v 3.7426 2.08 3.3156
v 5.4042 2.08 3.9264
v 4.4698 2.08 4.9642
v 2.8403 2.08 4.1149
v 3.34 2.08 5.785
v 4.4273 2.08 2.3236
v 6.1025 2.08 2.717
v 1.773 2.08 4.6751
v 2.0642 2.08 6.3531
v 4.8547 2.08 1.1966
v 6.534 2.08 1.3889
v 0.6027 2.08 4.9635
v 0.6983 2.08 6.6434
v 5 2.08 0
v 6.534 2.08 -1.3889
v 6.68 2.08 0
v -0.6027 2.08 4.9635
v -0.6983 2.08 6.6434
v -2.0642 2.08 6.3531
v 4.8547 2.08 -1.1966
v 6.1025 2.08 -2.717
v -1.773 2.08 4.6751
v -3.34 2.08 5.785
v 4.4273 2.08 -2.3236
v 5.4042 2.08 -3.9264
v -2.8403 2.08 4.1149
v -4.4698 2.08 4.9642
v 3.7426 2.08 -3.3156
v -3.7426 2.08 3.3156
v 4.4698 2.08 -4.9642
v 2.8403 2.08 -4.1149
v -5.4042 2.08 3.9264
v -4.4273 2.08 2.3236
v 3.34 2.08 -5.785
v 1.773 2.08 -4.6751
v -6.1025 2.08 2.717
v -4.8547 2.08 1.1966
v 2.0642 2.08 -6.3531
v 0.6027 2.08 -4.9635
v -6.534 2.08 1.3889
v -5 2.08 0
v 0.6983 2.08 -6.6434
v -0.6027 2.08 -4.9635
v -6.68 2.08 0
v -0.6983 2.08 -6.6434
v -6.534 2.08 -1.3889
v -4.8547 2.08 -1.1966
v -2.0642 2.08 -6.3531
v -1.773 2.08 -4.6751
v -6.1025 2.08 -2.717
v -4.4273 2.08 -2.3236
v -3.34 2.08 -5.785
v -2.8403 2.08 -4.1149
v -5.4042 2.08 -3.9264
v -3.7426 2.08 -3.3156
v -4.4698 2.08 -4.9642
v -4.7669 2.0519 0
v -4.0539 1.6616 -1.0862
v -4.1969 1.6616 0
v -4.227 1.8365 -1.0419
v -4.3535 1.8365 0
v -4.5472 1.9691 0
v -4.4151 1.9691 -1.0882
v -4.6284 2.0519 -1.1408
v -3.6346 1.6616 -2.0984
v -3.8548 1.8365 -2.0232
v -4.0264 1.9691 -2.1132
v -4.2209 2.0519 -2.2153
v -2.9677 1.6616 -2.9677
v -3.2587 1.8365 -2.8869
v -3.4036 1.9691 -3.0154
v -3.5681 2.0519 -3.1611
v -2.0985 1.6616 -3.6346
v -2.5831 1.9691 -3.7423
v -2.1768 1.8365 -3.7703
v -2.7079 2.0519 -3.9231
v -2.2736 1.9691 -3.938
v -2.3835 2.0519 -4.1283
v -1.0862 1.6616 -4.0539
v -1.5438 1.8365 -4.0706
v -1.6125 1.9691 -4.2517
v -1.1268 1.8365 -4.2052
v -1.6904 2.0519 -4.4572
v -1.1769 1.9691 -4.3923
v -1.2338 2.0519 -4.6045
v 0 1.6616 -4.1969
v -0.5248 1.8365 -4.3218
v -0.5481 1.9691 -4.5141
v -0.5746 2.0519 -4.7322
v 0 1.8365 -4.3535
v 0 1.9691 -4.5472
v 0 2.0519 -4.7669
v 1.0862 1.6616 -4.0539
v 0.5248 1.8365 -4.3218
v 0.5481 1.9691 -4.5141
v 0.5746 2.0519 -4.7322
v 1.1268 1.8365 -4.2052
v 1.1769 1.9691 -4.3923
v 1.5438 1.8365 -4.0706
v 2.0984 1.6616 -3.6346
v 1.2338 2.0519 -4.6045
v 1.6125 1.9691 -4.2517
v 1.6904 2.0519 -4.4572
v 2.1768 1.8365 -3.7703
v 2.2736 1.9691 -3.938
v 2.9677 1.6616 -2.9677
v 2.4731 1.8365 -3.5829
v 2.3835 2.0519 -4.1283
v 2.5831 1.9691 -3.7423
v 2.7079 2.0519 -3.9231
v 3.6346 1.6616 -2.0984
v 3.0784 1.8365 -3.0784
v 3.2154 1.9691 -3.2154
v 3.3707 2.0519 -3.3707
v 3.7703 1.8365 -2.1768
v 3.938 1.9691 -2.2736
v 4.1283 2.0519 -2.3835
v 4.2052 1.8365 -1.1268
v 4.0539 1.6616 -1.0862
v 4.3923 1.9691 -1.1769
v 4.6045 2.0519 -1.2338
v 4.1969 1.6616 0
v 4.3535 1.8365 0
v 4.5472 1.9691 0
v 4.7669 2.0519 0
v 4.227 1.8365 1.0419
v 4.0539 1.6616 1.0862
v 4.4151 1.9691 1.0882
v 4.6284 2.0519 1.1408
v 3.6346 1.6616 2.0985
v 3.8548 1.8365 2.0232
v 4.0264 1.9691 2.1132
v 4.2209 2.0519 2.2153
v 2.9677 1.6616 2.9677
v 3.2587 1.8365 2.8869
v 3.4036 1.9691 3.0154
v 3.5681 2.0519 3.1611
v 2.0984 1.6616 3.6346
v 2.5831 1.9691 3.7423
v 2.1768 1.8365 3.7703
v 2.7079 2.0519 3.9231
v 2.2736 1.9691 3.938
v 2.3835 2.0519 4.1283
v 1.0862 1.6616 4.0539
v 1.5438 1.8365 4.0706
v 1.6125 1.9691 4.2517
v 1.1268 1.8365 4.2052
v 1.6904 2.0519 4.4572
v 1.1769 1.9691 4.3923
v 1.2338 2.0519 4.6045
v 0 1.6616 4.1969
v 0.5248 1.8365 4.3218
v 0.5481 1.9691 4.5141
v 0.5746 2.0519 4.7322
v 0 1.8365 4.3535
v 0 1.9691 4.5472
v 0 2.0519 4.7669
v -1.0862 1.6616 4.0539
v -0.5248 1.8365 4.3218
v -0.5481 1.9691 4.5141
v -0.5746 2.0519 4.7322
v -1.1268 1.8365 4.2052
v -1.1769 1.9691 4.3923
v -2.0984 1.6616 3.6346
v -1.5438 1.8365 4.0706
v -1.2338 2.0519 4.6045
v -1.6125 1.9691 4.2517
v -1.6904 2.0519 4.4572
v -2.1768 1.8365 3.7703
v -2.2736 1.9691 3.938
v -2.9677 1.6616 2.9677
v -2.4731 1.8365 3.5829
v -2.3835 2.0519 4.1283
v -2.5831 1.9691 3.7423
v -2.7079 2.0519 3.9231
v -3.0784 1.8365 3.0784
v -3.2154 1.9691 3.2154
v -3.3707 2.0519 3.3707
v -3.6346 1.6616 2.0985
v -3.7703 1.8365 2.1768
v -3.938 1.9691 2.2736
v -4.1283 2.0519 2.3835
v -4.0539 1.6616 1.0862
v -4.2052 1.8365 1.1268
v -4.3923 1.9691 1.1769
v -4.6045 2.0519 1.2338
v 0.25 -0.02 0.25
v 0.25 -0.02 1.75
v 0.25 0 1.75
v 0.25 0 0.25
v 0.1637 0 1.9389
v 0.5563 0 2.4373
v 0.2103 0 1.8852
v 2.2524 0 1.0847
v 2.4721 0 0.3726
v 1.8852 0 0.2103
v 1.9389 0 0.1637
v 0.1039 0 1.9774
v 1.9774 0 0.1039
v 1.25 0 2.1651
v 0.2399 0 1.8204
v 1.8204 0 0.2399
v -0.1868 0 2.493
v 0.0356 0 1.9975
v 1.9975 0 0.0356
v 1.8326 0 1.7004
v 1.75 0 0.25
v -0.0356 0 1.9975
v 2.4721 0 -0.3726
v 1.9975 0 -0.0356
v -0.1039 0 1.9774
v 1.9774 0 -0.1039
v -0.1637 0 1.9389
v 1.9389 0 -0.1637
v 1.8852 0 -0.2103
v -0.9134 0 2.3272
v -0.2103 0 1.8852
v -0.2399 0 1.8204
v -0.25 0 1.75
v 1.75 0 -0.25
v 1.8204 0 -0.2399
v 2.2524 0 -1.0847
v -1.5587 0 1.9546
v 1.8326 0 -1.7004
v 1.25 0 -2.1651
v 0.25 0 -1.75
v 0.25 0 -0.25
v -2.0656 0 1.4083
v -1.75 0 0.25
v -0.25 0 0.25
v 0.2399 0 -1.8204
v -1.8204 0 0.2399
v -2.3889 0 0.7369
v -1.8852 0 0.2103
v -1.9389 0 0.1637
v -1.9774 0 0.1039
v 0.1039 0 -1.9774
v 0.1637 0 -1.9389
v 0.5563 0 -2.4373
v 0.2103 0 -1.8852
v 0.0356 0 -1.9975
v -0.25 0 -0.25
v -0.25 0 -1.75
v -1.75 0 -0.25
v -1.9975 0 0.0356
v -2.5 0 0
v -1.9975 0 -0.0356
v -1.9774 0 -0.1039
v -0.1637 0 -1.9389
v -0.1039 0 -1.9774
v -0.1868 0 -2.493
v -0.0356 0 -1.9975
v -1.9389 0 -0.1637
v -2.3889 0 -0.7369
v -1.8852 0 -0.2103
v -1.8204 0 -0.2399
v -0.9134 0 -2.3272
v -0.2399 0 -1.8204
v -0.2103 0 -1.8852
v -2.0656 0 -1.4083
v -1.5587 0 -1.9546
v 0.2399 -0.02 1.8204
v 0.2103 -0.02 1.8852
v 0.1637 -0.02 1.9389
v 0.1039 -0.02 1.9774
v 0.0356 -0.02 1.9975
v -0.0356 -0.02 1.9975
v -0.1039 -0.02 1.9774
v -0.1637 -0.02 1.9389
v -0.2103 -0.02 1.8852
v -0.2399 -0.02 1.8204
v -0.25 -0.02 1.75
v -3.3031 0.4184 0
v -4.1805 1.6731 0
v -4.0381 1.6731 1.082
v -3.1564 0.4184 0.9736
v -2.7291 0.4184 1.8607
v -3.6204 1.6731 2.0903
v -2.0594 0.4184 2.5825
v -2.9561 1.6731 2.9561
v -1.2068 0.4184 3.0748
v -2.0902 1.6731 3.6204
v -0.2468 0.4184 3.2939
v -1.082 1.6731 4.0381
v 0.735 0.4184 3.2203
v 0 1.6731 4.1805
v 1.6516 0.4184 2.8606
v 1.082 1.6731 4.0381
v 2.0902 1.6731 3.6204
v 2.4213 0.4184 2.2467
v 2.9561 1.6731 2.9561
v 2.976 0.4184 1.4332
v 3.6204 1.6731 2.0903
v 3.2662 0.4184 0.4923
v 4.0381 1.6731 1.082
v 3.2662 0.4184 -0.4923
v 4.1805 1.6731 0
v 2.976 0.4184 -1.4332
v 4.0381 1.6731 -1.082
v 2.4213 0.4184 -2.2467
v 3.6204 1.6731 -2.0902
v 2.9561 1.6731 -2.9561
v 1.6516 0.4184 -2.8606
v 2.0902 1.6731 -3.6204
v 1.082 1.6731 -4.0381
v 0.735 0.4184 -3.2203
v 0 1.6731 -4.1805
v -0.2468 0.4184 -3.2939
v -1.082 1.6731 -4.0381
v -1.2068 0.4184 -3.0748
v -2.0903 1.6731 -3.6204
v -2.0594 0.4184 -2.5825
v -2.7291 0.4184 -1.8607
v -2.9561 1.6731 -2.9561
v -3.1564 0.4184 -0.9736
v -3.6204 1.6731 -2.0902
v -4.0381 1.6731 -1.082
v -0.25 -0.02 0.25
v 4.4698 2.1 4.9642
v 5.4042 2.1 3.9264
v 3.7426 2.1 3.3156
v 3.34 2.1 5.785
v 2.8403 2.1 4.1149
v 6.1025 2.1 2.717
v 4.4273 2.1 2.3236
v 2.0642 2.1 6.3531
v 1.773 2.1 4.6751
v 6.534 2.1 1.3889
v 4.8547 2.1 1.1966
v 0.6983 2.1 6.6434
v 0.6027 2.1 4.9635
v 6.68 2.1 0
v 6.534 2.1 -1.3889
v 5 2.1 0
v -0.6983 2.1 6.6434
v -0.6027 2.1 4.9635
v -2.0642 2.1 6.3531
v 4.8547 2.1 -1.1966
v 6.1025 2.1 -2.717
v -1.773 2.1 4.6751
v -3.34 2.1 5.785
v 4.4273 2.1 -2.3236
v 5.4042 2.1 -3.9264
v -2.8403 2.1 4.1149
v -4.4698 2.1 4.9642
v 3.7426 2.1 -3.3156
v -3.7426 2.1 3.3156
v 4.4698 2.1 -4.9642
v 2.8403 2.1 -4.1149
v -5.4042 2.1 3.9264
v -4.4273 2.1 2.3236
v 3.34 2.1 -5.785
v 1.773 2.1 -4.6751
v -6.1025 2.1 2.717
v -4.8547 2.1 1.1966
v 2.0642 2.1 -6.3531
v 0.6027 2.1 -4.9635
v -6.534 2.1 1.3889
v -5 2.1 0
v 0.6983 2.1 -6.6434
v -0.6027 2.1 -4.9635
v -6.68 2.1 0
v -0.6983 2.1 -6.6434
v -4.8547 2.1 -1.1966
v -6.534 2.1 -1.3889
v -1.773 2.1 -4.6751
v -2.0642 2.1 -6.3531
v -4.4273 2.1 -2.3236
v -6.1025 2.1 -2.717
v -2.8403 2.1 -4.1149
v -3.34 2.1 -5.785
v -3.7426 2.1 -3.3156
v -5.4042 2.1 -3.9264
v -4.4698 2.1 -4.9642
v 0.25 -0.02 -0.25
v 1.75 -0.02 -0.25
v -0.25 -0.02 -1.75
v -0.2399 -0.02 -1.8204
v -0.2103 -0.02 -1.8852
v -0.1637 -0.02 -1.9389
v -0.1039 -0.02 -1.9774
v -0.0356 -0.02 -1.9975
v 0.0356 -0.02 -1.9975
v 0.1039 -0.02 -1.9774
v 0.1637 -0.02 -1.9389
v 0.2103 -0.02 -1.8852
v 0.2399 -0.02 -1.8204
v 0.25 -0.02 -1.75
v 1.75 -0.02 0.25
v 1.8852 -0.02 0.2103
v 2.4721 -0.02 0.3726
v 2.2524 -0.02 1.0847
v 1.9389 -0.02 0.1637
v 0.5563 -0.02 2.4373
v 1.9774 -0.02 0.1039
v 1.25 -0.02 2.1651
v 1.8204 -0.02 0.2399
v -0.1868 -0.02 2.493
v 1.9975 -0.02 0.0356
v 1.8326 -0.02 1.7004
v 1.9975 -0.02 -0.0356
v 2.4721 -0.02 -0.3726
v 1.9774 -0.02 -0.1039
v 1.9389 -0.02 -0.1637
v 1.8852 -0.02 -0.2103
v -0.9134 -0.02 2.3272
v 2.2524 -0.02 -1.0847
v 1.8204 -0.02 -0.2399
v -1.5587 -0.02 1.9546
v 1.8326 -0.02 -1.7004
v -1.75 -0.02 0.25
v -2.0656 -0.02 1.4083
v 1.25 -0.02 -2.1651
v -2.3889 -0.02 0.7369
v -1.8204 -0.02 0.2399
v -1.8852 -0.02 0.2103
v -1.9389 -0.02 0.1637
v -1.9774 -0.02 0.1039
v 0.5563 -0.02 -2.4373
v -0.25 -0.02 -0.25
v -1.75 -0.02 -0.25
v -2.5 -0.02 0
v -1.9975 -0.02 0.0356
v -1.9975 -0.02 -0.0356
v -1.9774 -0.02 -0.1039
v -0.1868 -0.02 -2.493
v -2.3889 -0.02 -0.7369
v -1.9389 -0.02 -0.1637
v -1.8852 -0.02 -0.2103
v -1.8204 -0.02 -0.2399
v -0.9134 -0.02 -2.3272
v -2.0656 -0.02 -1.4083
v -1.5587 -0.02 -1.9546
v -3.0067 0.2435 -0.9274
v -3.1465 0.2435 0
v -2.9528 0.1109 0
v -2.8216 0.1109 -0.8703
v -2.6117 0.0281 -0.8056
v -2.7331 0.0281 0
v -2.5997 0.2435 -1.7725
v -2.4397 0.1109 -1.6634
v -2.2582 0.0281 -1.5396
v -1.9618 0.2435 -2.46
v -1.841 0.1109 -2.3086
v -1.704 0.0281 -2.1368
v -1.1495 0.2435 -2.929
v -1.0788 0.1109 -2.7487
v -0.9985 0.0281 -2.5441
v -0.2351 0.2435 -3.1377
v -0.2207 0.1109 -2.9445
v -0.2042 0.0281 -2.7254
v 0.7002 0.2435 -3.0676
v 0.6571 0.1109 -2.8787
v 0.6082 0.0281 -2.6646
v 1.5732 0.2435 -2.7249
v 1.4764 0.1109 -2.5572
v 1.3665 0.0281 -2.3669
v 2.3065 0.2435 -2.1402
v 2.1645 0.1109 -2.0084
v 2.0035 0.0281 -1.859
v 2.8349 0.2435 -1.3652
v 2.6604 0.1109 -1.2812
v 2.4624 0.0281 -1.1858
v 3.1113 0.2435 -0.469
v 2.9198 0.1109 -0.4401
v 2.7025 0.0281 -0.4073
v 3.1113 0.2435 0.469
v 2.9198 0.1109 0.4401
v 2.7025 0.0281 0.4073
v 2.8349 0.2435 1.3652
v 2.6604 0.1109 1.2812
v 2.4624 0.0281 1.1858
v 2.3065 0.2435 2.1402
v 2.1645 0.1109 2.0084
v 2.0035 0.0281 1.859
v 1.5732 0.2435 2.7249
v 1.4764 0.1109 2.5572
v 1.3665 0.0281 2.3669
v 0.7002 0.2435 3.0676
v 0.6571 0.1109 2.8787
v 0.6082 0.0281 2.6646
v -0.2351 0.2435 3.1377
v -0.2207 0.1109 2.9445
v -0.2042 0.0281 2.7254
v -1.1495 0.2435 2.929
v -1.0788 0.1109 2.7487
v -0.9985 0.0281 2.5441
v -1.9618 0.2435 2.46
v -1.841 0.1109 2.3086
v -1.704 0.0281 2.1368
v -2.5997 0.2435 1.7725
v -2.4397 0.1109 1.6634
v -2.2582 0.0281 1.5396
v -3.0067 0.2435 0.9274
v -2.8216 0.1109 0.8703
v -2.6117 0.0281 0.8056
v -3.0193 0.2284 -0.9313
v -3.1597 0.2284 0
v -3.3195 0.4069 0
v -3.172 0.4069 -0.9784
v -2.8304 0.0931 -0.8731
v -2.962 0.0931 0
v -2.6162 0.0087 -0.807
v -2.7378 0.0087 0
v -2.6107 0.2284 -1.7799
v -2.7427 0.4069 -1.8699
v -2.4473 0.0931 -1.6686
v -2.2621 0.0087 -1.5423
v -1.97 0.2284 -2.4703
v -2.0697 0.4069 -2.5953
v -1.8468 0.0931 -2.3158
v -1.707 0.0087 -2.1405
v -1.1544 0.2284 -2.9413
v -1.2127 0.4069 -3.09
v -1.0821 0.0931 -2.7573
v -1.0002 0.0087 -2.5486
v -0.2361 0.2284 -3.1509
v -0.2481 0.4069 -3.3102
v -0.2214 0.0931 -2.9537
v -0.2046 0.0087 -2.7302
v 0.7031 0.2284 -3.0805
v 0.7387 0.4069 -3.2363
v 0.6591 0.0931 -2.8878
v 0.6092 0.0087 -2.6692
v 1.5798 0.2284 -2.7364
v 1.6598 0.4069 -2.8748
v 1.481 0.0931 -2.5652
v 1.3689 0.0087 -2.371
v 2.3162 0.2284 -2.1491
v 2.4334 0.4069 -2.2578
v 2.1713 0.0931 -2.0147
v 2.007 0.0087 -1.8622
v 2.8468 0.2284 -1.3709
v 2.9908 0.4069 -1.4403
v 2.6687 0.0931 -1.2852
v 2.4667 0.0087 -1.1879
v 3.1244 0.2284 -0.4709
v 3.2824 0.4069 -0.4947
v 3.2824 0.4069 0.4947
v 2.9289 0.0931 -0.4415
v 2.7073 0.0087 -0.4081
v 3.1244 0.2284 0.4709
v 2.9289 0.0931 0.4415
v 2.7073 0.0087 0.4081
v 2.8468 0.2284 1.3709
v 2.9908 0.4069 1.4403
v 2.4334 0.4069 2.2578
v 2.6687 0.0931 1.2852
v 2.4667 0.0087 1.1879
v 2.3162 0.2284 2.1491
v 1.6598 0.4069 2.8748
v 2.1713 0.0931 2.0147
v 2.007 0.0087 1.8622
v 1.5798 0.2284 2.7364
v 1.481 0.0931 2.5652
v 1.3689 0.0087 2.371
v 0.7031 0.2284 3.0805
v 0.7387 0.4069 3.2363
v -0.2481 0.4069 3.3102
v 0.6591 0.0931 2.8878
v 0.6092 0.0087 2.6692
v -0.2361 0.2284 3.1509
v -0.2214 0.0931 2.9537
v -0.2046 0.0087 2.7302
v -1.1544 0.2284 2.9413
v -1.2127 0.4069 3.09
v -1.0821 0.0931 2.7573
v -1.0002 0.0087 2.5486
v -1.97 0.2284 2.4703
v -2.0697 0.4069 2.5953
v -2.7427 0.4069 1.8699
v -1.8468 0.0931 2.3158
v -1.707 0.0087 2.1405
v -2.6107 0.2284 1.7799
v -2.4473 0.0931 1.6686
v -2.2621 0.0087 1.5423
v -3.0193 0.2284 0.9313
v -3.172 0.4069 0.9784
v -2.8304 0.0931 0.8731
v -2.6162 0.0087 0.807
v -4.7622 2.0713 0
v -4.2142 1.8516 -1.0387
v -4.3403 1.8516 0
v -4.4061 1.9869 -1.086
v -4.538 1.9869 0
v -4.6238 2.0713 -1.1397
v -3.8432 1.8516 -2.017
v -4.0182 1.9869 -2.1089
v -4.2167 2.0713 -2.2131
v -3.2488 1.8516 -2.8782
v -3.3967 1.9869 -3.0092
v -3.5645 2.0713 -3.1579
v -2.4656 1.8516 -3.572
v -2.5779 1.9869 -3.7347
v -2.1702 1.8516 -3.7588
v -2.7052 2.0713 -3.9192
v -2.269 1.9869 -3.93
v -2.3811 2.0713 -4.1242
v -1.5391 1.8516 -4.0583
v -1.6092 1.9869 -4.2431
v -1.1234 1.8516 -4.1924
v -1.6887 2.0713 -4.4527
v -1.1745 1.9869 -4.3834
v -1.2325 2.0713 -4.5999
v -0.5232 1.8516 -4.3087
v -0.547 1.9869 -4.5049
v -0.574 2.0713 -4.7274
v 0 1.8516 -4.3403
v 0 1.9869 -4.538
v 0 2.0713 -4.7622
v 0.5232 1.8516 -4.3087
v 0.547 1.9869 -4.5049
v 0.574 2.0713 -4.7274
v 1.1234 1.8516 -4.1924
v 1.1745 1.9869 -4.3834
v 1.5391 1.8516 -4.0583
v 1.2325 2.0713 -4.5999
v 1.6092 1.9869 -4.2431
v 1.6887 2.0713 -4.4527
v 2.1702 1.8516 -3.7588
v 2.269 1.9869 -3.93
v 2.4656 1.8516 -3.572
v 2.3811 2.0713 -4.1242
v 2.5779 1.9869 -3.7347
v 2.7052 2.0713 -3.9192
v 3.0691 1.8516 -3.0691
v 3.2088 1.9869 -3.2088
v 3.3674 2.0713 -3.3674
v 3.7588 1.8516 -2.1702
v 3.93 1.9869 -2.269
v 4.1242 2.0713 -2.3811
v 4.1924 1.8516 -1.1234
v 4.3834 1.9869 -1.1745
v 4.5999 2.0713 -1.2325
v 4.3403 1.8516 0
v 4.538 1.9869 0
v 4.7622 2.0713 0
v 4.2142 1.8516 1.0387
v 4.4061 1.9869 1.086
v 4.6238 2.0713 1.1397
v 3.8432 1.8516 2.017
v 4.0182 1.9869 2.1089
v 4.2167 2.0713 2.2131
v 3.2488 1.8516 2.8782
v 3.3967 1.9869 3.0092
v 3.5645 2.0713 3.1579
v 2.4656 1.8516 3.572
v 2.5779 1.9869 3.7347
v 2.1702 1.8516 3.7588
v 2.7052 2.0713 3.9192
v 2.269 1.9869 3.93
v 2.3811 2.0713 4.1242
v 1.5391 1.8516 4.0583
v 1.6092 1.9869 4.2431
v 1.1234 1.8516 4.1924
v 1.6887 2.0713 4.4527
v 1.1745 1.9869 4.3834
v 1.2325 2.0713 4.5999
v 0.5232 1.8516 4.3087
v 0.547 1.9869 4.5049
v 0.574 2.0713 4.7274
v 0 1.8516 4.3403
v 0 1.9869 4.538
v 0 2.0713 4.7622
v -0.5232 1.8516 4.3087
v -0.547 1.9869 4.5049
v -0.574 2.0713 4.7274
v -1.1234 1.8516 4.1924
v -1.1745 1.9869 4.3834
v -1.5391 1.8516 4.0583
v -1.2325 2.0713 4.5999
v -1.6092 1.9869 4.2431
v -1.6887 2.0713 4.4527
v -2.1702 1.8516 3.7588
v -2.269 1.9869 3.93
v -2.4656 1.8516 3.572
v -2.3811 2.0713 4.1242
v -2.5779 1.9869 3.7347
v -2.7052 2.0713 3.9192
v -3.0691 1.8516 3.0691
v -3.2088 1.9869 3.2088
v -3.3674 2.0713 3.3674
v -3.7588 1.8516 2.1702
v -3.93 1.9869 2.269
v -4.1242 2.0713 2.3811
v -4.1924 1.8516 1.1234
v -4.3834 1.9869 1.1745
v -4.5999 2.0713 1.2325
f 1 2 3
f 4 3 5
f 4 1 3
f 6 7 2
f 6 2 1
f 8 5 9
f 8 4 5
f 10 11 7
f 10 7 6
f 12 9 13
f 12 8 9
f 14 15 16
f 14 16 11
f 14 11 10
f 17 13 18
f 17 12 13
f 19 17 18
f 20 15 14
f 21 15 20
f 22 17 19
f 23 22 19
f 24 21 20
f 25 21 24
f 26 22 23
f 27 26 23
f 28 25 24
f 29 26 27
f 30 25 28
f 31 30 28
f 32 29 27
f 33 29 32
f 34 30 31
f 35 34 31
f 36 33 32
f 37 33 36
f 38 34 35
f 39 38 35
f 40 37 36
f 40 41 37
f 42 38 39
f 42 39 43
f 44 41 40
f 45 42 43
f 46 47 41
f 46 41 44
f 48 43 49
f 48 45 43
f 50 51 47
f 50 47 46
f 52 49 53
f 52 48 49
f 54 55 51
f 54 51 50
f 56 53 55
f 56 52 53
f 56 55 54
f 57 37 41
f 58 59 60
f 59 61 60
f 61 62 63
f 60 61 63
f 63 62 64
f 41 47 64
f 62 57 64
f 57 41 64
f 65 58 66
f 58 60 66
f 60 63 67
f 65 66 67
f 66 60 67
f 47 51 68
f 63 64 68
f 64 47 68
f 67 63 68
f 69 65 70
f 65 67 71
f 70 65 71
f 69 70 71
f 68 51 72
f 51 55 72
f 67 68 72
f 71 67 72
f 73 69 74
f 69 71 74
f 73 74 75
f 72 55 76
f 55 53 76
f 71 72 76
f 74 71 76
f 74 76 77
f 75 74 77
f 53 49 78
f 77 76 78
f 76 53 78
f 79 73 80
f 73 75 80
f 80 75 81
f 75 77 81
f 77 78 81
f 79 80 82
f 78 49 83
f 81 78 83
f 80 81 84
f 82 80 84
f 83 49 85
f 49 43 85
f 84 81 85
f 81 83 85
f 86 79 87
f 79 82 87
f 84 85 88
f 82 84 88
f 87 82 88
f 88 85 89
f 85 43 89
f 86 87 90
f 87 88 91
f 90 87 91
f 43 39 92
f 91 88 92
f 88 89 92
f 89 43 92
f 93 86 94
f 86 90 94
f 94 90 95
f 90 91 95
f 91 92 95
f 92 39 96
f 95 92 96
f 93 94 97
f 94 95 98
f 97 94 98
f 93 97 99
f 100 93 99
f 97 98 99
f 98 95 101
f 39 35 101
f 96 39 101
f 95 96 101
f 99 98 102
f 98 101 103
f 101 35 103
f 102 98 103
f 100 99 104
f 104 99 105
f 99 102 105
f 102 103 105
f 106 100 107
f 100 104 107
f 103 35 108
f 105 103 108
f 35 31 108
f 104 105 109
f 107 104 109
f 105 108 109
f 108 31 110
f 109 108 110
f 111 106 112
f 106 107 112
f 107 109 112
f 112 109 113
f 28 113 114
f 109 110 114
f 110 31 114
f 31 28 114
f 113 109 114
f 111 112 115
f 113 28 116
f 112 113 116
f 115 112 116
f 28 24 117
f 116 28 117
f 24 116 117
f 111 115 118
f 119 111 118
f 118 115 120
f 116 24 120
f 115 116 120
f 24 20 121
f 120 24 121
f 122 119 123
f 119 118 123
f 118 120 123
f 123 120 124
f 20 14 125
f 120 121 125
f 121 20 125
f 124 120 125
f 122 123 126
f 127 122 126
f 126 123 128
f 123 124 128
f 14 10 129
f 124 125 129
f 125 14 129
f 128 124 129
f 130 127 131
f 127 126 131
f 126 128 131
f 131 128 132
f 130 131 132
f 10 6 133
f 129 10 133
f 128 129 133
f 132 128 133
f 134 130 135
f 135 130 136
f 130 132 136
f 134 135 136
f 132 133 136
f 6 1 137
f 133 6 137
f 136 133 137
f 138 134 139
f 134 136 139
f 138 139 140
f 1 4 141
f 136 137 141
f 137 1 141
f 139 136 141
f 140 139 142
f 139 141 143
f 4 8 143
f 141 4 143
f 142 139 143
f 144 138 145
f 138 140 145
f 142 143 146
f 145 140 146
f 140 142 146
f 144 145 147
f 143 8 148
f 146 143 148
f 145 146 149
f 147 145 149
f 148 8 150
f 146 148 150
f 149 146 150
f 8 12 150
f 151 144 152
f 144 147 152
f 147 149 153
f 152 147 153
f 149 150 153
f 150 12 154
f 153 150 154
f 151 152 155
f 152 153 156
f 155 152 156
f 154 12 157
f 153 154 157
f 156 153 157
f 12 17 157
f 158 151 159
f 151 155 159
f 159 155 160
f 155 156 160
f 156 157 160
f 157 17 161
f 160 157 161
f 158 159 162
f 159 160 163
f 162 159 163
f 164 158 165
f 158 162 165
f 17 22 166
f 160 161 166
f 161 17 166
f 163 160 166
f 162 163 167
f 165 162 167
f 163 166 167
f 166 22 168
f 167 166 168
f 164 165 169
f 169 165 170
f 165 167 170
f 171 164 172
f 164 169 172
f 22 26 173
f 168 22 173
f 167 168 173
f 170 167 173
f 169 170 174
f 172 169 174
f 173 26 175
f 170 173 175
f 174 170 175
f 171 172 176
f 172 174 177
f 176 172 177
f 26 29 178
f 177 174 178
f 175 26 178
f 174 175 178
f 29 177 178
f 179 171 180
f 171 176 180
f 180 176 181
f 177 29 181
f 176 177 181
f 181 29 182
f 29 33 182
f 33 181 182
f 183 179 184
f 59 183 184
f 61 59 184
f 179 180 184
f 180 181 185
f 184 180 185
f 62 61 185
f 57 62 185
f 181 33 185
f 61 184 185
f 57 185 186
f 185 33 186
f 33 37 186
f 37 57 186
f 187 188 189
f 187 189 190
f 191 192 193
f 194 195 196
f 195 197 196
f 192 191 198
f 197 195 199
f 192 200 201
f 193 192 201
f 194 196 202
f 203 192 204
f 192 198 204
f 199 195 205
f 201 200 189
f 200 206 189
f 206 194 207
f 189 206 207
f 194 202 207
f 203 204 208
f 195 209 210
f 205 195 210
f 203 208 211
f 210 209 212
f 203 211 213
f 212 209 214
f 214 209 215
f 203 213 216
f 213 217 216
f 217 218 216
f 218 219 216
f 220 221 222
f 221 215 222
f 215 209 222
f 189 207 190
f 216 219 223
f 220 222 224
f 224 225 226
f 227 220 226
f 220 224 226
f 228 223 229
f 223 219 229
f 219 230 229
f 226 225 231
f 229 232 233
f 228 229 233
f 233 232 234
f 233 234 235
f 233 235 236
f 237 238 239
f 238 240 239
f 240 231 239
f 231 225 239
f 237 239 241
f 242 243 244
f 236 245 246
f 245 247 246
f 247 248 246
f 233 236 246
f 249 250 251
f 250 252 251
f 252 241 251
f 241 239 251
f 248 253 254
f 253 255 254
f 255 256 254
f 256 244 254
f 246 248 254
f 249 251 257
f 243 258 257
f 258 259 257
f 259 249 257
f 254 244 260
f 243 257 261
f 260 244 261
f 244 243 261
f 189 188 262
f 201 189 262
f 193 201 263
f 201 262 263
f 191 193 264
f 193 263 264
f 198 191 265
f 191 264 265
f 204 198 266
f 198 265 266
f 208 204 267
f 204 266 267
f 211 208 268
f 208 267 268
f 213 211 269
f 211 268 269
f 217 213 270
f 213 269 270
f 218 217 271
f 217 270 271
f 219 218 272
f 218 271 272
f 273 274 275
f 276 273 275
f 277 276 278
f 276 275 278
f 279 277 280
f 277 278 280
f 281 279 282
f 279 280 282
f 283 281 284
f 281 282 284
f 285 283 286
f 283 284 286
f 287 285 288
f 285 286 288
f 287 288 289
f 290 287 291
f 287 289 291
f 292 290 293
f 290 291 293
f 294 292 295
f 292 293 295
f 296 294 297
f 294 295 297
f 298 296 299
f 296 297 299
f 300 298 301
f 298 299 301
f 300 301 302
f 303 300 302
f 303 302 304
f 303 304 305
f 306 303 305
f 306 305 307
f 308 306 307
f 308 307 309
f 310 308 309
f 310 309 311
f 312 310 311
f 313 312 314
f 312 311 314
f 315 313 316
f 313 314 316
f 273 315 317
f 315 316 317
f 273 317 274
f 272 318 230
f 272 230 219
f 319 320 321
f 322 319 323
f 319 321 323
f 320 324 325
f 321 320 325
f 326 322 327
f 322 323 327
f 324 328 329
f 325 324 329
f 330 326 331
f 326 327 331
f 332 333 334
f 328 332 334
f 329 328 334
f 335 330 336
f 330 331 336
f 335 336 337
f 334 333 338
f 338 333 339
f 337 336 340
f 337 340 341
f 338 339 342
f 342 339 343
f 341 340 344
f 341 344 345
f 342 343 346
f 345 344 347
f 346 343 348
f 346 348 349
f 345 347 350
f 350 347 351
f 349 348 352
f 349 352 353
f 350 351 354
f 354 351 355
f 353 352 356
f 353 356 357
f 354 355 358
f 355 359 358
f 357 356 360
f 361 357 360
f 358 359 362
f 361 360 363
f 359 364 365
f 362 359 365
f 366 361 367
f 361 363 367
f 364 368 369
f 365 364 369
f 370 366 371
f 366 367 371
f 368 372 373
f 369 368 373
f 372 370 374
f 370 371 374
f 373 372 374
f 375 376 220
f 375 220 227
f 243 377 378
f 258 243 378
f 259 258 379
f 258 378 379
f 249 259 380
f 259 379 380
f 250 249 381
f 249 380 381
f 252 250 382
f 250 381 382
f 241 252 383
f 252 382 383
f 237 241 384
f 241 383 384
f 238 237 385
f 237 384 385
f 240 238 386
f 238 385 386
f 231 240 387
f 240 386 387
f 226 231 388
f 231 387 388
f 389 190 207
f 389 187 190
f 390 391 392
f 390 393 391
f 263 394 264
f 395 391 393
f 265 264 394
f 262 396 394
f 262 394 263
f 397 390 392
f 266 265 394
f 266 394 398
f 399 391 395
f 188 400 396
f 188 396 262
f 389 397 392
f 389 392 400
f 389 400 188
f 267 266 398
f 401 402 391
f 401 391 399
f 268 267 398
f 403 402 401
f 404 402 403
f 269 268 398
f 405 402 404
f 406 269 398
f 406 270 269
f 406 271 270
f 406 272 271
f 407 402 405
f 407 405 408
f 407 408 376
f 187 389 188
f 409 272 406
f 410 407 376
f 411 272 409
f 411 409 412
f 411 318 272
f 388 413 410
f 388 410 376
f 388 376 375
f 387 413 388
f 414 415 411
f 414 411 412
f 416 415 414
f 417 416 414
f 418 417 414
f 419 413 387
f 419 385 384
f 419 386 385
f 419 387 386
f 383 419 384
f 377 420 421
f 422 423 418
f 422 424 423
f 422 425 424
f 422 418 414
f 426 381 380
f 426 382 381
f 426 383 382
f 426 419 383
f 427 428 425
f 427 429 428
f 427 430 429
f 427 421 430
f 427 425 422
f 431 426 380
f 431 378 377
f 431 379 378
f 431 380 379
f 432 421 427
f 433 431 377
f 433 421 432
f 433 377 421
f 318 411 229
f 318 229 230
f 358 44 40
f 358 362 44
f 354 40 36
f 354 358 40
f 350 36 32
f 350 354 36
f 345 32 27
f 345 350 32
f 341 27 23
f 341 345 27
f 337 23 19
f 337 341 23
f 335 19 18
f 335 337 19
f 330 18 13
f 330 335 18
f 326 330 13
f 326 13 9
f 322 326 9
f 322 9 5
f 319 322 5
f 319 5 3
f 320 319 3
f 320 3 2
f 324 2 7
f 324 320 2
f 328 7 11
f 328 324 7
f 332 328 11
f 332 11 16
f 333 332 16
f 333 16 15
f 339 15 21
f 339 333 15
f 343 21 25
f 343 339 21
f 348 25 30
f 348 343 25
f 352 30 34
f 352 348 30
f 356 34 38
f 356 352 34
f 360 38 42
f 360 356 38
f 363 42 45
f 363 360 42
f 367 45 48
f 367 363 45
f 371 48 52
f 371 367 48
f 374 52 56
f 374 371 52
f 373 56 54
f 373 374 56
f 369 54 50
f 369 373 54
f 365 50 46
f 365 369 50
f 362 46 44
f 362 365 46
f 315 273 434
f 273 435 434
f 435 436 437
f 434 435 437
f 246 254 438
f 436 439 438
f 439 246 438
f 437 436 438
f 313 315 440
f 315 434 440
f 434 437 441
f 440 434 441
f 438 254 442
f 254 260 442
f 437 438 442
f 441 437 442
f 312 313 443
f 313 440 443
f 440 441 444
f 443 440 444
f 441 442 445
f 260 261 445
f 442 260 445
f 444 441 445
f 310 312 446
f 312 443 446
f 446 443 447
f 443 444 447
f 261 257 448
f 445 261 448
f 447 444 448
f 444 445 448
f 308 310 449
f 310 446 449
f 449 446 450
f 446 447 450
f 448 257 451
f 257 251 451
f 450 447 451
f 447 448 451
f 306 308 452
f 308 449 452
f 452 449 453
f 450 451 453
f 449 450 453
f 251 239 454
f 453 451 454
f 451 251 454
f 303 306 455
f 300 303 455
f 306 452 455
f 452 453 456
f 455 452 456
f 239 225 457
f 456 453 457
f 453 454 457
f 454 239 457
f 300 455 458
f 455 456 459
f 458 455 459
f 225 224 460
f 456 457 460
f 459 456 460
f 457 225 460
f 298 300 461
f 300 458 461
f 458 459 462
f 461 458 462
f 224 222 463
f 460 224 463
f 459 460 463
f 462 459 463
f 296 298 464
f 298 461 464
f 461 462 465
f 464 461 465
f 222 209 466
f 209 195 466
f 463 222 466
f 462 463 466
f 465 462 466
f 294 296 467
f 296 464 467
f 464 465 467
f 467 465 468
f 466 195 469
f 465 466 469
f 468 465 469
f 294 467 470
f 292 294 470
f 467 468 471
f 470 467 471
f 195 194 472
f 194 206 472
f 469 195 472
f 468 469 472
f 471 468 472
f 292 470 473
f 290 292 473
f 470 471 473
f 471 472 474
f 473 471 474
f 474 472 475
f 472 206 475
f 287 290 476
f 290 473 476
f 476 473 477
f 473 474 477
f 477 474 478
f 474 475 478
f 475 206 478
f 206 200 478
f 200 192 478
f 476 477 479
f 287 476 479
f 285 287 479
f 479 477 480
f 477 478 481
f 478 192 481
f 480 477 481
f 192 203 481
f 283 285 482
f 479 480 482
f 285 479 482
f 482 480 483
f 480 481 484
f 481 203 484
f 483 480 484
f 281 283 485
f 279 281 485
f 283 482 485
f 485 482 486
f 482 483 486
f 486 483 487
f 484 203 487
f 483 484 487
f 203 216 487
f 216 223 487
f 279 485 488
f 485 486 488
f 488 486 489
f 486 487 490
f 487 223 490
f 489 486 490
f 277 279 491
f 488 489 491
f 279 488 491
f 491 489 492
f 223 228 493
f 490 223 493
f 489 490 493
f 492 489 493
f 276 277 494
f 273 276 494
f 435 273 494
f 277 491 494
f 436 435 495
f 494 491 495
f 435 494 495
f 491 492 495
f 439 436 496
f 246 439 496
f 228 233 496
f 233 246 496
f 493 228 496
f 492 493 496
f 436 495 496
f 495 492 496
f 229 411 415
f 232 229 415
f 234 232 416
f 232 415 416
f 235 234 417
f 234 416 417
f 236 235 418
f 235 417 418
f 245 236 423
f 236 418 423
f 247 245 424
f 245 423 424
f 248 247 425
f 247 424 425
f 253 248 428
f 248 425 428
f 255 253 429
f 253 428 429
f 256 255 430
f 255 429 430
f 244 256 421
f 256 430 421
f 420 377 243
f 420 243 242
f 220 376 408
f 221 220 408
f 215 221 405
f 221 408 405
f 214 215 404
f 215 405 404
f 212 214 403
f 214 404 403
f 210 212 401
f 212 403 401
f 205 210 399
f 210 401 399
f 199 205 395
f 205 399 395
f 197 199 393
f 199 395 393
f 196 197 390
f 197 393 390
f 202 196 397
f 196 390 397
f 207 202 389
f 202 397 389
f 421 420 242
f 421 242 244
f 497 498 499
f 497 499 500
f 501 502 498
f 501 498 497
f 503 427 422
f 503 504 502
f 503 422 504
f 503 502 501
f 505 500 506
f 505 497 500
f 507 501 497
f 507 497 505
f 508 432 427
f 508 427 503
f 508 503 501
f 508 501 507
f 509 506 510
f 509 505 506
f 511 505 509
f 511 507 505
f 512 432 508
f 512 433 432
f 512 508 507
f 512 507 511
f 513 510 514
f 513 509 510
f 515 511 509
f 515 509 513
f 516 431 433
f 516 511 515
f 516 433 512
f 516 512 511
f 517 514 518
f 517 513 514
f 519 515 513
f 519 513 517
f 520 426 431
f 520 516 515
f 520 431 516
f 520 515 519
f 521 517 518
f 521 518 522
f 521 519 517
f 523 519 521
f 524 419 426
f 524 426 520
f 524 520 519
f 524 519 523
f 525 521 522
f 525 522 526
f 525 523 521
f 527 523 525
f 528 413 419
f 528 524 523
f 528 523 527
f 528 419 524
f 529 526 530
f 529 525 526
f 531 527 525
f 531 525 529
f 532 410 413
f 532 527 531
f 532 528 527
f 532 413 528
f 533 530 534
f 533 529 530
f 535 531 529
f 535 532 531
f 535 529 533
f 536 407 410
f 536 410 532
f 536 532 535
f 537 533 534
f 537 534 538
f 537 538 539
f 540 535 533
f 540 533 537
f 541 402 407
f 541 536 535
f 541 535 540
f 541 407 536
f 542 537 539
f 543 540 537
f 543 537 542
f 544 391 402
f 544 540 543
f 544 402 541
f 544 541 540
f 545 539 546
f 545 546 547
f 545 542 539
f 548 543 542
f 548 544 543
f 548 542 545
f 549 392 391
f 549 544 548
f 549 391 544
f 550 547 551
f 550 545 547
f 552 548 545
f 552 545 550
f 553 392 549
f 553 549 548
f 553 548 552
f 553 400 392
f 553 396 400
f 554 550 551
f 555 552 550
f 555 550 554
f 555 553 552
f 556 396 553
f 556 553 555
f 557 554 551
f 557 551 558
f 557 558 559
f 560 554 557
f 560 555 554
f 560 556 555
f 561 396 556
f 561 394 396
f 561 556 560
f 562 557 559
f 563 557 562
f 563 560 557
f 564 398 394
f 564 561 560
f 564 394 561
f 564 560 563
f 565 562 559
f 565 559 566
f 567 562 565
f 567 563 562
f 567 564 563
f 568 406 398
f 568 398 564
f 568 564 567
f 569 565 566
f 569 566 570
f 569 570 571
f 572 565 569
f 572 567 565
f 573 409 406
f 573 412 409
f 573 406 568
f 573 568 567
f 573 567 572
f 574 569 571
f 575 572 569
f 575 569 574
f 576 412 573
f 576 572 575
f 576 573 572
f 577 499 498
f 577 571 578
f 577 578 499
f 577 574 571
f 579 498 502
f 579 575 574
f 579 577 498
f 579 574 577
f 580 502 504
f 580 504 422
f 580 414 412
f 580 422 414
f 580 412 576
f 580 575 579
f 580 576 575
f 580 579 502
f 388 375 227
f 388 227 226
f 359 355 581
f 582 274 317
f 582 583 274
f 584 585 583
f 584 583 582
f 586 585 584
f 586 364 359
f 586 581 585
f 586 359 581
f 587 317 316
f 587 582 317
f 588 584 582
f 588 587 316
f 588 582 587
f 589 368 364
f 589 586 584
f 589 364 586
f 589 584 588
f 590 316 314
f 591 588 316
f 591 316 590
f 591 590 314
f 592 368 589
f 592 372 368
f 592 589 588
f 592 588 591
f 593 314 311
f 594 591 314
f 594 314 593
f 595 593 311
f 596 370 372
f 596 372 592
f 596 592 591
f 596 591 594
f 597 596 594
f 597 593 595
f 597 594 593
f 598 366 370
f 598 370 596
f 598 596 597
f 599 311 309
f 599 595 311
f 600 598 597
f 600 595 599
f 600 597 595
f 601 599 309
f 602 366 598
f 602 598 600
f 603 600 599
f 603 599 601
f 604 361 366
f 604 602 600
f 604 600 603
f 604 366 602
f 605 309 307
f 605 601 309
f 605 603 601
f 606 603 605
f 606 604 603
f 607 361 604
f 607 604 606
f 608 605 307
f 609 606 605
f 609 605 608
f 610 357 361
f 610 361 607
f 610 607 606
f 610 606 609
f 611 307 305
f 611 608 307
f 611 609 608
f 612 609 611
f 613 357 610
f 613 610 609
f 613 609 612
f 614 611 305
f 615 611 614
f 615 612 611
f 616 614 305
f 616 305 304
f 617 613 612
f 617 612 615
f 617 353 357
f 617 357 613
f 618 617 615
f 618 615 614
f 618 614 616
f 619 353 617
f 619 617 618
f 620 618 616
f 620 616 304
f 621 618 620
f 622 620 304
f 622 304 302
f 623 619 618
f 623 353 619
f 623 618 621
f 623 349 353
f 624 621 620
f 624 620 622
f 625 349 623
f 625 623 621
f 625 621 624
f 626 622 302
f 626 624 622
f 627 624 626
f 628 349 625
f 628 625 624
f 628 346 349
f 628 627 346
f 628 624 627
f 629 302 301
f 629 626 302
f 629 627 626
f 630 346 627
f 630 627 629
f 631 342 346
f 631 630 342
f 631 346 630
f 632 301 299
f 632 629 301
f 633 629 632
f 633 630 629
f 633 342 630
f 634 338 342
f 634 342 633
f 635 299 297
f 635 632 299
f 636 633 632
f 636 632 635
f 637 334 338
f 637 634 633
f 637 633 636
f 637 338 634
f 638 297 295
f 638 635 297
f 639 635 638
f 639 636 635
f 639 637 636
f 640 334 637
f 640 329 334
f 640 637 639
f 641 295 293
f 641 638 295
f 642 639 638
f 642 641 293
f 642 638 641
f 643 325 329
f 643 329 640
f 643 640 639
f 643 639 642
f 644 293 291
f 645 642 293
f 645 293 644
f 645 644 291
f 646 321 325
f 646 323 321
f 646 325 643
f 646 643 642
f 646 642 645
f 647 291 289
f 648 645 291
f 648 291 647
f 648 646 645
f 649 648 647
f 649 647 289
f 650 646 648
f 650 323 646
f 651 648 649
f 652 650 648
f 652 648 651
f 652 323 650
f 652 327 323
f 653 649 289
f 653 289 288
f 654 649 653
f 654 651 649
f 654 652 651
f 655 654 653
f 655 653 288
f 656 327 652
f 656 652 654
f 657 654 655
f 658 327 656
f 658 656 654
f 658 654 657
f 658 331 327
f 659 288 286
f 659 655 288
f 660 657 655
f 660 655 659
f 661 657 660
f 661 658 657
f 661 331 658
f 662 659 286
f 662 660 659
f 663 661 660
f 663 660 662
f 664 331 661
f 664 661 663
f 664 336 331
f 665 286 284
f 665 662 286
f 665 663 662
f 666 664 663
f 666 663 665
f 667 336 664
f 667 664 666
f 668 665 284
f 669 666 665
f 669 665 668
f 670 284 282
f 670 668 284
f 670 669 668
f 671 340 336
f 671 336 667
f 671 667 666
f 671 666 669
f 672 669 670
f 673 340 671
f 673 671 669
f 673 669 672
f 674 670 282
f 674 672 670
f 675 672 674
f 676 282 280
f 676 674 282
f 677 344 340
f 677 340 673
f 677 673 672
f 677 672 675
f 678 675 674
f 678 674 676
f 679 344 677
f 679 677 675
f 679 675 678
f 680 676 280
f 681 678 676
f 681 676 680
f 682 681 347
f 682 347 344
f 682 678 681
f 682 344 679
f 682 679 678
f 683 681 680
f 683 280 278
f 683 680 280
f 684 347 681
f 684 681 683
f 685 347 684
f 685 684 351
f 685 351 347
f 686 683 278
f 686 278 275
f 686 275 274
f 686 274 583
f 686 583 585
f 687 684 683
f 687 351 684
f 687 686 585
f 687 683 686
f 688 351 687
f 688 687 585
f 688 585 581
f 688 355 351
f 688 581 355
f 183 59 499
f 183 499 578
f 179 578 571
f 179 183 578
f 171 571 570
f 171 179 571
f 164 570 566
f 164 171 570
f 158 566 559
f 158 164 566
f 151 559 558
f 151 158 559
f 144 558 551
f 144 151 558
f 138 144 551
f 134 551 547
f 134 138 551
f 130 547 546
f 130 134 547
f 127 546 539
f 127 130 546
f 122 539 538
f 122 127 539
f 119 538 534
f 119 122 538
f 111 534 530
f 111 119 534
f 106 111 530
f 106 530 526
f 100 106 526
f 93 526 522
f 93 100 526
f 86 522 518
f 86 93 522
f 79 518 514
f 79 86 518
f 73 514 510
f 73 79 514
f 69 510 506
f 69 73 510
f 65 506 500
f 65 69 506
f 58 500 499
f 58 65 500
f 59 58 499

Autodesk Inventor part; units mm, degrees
ref_plane "YZ Plane" through (0, 0, 0) normal (1, 0, 0) x (0, 1, 0)
ref_plane "XZ Plane" through (0, 0, 0) normal (0, 1, 0) x (-1, 0, 0)
ref_plane "XY Plane" through (0, 0, 0) normal (0, 0, 1) x (1, 0, 0)
sketch "Skizze1" plane through (0, 0, 0) normal (0, 0, 1) x (1, 0, 0)
  line L0 (0, 0) -> (0, -0.02)
  line L1 (0, -0.02) -> (-2.5, -0.02)
  arc A0 (-3.3195, 0.4069) -> (-2.5, -0.02) centre (-2.5, 0.98) ccw
  line L2 (-3.3195, 0.4069) -> (-4.1969, 1.6616)
  arc A1 (-4.1969, 1.6616) -> (-5, 2.08) centre (-5, 1.1) ccw
  line L3 (-5, 2.08) -> (-6.68, 2.08)
  line L4 (-6.68, 2.08) -> (-6.68, 2.1)
  line L5 (-6.68, 2.1) -> (-5, 2.1)
  arc A2 (-4.1805, 1.6731) -> (-5, 2.1) centre (-5, 1.1) ccw
  line L6 (-4.1805, 1.6731) -> (-3.3031, 0.4184)
  line L7 (-2.5, 0) -> (0, 0)
  arc A3 (-3.3031, 0.4184) -> (-2.5, 0) centre (-2.5, 0.98) ccw
  dimension "d0" = 0.02
  dimension "d2" = 10
  dimension "d3" = 0.02
  dimension "d4" = 1
  dimension "d5" = 2.1
  dimension "d6" = 5
revolve "Umdrehung1" add sketch "Skizze1" angle 360 about axis through (0, 0, 0) along (0, -1, 0)
sketch "Skizze2" plane through (0, -0.02, 0) normal (0, -1, 0) x (1, 0, 0)
  line L0 (0, 0) -> (0, 2)
  line L1 (0, 2) -> (0.25, 2)
  line L2 (0.25, 2) -> (0.25, 0.25)
  line L3 (0.25, 0.25) -> (2, 0.25)
  line L4 (2, 0.25) -> (2, 0)
  line L5 (2, 0) -> (0, 0)
  arc A0 (2, 0) -> (1.75, 0.25) centre (1.75, 0) ccw
  arc A1 (0.25, 1.75) -> (0, 2) centre (0, 1.75) ccw
  arc A2 (-1.75, 0.25) -> (-2, 0) centre (-1.75, 0) ccw
  line L6 (-2, 0.25) -> (-0.25, 0.25)
  line L7 (-0.25, 2) -> (0, 2)
  arc A3 (0, 2) -> (-0.25, 1.75) centre (0, 1.75) ccw
  line L8 (-0.25, 0.25) -> (-0.25, 2)
  line L9 (-2, 0) -> (-2, 0.25)
  arc A4 (-0.25, -1.75) -> (0, -2) centre (0, -1.75) ccw
  line L10 (-0.25, -2) -> (-0.25, -0.25)
  line L11 (-2, -0.25) -> (-2, 0)
  arc A5 (-2, 0) -> (-1.75, -0.25) centre (-1.75, 0) ccw
  line L12 (-0.25, -0.25) -> (-2, -0.25)
  line L13 (0, -2) -> (-0.25, -2)
  arc A6 (1.75, -0.25) -> (2, 0) centre (1.75, 0) ccw
  line L14 (2, -0.25) -> (0.25, -0.25)
  line L15 (0.25, -2) -> (0, -2)
  arc A7 (0, -2) -> (0.25, -1.75) centre (0, -1.75) ccw
  line L16 (0.25, -0.25) -> (0.25, -2)
  line L17 (2, 0) -> (2, -0.25)
  point P0 (0, 2)
  point P1 (-2, 0)
  point P2 (0, -2)
  dimension "d8" = 4
  dimension "d9" = 0.5
  dimension "d12" = 360
extrude "Extrusion1" cut sketch "Skizze2" against normal through all contours L5 A6 L14 L16 A7 A4 L10 L12 A5 A2 L6 L8 A3 L0 | L0 A1 L2 L3 A0 L5
equation "\"d3\" = d0"
equation "\"Biegeradius\" = Stärke"
equation "\"BreiteBiegungsfreistellung\" = Stärke"
equation "\"TiefeBiegungsfreistellung\" = 0.5 * Stärke"
equation "\"GrößeEckenfreistellung\" = 4 * Stärke"
equation "\"MinimalRest\" = 2 * Stärke"
equation "\"Übergangsradius\" = Biegeradius"
equation "\"JacobiRadiusGröße\" = Biegeradius"
equation "\"Abstandsgröße\" = Stärke"
equation "\"Stärke\" = 0.5"
